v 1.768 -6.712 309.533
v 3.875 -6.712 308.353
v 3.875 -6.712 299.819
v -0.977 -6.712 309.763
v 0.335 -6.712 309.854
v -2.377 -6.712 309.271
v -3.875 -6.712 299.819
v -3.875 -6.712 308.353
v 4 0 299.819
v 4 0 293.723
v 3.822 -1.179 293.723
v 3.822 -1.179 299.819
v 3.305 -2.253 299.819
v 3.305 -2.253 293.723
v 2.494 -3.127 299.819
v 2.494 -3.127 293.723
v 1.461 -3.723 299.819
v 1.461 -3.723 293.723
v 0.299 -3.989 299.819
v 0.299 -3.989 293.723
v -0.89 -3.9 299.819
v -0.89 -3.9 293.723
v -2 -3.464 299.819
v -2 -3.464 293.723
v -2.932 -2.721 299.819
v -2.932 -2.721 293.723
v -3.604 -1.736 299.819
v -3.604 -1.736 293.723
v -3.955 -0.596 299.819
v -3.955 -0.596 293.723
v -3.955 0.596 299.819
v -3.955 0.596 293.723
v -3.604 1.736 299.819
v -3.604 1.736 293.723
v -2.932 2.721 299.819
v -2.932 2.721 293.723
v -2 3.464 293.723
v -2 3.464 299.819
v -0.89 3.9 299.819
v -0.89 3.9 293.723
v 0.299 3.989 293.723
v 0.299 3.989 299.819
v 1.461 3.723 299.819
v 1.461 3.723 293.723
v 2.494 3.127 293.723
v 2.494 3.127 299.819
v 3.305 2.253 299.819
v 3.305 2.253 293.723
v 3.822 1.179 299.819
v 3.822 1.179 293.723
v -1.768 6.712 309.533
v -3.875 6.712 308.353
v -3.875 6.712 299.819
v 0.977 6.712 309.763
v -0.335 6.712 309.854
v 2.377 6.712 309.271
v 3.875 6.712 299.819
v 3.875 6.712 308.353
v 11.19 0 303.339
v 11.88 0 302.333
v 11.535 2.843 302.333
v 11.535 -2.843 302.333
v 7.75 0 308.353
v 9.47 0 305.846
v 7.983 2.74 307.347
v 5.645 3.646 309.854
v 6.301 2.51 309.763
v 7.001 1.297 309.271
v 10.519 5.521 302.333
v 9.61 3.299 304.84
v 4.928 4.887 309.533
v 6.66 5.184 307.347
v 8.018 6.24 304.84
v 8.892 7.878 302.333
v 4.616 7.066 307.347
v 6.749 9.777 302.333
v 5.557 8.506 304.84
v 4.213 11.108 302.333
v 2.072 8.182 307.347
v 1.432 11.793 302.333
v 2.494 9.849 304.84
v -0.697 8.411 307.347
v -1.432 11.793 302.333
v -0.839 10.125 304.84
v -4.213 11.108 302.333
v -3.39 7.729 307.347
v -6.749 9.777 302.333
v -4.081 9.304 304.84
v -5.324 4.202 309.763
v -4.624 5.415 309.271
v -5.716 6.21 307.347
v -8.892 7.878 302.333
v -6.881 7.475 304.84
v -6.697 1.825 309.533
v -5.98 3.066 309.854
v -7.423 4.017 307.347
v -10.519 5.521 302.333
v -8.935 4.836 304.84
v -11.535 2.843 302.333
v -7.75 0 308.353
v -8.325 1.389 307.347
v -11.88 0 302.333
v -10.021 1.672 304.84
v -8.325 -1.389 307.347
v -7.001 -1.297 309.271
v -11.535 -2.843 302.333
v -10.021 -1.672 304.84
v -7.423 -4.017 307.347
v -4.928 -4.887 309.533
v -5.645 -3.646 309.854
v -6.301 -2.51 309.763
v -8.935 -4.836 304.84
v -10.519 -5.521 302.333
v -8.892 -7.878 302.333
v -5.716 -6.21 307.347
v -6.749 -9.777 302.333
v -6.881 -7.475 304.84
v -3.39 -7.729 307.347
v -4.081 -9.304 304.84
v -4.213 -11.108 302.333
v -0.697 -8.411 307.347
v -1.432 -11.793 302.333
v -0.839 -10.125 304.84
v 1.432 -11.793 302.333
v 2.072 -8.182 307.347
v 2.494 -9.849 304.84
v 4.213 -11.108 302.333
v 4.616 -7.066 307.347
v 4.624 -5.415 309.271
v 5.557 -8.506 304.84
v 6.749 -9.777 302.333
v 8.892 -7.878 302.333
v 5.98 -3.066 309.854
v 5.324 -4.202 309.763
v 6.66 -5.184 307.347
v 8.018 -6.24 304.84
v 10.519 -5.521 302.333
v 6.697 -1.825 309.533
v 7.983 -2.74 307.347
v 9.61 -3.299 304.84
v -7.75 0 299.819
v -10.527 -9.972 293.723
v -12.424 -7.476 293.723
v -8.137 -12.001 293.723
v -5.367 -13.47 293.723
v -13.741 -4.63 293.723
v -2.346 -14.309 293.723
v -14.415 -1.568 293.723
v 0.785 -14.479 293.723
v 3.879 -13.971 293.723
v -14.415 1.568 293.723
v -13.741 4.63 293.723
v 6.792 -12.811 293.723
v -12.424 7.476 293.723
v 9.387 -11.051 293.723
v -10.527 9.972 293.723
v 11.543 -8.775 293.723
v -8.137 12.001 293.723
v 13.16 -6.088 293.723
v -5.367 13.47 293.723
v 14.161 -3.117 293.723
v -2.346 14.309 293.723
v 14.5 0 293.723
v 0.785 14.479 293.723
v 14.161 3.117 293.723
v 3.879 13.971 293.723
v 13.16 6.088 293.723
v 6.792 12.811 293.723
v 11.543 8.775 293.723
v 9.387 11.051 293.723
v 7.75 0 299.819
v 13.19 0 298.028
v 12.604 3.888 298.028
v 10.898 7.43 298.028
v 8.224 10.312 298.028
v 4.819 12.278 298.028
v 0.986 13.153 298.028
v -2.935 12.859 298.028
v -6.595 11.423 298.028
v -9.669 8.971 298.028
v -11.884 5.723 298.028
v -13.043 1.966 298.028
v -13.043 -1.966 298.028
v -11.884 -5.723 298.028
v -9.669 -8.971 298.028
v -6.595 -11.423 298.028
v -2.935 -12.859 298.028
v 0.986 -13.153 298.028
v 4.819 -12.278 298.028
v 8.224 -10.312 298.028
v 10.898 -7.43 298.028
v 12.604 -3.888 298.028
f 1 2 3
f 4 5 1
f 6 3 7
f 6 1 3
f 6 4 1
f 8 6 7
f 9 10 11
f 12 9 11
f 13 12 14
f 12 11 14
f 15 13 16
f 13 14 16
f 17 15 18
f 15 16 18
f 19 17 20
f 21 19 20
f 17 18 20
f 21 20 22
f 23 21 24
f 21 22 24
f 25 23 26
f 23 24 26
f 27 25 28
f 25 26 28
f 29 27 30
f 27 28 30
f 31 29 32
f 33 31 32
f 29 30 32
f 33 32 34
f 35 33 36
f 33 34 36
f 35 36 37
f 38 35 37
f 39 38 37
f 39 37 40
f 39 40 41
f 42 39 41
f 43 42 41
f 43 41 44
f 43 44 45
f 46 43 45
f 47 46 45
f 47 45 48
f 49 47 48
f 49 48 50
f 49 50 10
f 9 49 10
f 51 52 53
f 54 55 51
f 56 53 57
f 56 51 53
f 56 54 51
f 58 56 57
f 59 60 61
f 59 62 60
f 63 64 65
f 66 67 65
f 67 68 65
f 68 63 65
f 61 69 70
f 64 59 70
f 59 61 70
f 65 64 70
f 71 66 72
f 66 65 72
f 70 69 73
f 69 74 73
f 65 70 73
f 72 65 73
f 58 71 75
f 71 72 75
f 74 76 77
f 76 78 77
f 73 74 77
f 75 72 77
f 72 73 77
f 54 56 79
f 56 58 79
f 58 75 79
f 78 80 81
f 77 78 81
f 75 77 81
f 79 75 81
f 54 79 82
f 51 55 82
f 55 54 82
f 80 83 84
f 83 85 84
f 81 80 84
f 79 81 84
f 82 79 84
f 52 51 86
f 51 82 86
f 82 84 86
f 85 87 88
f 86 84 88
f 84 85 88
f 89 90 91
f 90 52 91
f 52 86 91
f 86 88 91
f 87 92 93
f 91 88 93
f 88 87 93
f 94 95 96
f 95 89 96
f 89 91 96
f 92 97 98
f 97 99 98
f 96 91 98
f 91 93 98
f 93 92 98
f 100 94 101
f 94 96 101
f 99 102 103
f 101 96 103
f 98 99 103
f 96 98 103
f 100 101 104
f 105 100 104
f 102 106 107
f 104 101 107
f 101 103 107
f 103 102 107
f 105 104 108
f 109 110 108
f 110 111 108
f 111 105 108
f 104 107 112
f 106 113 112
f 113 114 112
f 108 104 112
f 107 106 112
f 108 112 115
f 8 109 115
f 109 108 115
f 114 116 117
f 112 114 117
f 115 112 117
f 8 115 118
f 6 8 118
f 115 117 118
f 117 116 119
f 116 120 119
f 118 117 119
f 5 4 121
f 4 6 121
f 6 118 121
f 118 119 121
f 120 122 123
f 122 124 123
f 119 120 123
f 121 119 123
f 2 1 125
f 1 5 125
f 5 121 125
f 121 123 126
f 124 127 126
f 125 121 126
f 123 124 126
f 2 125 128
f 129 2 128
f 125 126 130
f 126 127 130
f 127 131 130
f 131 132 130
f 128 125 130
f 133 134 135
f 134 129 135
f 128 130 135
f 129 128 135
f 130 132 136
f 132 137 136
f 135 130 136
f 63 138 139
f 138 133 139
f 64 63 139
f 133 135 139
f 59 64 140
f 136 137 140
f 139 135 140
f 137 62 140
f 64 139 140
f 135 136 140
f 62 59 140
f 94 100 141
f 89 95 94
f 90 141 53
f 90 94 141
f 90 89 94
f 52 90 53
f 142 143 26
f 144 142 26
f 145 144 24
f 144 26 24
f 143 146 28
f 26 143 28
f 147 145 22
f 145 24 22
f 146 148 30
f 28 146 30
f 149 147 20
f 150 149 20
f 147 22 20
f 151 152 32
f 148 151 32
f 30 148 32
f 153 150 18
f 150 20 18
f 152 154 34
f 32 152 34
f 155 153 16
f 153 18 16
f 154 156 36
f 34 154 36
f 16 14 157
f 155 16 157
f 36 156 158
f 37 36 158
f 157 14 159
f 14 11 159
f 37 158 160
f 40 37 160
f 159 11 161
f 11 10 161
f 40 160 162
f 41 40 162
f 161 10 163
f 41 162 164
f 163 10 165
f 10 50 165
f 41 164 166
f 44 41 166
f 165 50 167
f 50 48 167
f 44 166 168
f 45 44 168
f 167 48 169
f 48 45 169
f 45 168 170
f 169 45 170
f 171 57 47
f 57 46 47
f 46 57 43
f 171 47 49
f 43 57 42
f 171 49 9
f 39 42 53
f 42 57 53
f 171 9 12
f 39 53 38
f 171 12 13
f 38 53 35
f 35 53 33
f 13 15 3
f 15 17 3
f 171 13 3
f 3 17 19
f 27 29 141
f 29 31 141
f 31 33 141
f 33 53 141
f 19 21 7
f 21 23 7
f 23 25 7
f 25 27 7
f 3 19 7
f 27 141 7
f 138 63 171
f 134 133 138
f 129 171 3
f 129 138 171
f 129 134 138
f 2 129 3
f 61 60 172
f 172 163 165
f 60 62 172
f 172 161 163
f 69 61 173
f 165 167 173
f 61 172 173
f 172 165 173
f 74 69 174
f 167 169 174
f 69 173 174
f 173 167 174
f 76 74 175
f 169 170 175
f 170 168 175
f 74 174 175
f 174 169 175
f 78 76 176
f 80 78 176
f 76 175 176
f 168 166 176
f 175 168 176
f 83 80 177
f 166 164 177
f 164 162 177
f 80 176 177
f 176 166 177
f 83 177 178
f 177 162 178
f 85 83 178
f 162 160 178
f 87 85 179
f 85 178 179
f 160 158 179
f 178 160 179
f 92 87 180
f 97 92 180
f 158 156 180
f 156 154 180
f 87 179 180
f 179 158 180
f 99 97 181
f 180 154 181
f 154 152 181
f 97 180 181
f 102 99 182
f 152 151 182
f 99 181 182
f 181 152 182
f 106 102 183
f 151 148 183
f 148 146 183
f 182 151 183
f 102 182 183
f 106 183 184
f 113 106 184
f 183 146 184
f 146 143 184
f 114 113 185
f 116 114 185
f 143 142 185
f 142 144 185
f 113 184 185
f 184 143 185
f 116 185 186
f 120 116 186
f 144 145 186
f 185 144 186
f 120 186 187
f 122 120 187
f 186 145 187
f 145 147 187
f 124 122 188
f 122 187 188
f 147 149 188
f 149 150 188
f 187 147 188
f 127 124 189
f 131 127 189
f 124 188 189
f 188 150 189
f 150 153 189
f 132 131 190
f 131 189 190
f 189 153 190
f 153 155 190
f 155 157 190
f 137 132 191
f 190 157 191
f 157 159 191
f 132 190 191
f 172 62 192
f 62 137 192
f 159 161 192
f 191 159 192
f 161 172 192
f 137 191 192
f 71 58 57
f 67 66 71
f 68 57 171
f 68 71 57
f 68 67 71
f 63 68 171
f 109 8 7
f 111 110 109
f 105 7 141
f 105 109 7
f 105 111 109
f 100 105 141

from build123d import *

# Parameters (mm, degrees)
SKETCH057_R     = 4
POCKET022_DEPTH = 25.927831
POCKET023_DEPTH = 14


with BuildPart() as part:
    # Sketch056 → Revolution004 (revolve)
    with BuildSketch(Plane.XZ):
        Polygon((0, 319.649472), (11.88, 302.332844), (14.5, 293.722641), (0, 293.722641), align=None)
    revolve(axis=Axis((0, 0, 0), (0, 0, 1)))

    # Sketch057 (on Face3 of Revolution004) → Pocket022 (cut, through all)
    with BuildSketch(Plane(origin=(0, 0, 293.722641), x_dir=(1, 0, 0), z_dir=(0, 0, -1))):
        Circle(SKETCH057_R)
    extrude(amount=-POCKET022_DEPTH, mode=Mode.SUBTRACT)

    # Sketch058 (on DatumPlane) → Pocket023 (cut)
    with BuildSketch(Plane(origin=(0, 0, 313.818958), x_dir=(0, -1, 0), z_dir=(0, 0, -1))):
        Polygon((6.711697, -3.875), (6.711697, 3.875), (0, 7.75), (-6.711697, 3.875), (-6.711697, -3.875), (0, -7.75), align=None)
    extrude(amount=POCKET023_DEPTH, mode=Mode.SUBTRACT)


solid = part.part
